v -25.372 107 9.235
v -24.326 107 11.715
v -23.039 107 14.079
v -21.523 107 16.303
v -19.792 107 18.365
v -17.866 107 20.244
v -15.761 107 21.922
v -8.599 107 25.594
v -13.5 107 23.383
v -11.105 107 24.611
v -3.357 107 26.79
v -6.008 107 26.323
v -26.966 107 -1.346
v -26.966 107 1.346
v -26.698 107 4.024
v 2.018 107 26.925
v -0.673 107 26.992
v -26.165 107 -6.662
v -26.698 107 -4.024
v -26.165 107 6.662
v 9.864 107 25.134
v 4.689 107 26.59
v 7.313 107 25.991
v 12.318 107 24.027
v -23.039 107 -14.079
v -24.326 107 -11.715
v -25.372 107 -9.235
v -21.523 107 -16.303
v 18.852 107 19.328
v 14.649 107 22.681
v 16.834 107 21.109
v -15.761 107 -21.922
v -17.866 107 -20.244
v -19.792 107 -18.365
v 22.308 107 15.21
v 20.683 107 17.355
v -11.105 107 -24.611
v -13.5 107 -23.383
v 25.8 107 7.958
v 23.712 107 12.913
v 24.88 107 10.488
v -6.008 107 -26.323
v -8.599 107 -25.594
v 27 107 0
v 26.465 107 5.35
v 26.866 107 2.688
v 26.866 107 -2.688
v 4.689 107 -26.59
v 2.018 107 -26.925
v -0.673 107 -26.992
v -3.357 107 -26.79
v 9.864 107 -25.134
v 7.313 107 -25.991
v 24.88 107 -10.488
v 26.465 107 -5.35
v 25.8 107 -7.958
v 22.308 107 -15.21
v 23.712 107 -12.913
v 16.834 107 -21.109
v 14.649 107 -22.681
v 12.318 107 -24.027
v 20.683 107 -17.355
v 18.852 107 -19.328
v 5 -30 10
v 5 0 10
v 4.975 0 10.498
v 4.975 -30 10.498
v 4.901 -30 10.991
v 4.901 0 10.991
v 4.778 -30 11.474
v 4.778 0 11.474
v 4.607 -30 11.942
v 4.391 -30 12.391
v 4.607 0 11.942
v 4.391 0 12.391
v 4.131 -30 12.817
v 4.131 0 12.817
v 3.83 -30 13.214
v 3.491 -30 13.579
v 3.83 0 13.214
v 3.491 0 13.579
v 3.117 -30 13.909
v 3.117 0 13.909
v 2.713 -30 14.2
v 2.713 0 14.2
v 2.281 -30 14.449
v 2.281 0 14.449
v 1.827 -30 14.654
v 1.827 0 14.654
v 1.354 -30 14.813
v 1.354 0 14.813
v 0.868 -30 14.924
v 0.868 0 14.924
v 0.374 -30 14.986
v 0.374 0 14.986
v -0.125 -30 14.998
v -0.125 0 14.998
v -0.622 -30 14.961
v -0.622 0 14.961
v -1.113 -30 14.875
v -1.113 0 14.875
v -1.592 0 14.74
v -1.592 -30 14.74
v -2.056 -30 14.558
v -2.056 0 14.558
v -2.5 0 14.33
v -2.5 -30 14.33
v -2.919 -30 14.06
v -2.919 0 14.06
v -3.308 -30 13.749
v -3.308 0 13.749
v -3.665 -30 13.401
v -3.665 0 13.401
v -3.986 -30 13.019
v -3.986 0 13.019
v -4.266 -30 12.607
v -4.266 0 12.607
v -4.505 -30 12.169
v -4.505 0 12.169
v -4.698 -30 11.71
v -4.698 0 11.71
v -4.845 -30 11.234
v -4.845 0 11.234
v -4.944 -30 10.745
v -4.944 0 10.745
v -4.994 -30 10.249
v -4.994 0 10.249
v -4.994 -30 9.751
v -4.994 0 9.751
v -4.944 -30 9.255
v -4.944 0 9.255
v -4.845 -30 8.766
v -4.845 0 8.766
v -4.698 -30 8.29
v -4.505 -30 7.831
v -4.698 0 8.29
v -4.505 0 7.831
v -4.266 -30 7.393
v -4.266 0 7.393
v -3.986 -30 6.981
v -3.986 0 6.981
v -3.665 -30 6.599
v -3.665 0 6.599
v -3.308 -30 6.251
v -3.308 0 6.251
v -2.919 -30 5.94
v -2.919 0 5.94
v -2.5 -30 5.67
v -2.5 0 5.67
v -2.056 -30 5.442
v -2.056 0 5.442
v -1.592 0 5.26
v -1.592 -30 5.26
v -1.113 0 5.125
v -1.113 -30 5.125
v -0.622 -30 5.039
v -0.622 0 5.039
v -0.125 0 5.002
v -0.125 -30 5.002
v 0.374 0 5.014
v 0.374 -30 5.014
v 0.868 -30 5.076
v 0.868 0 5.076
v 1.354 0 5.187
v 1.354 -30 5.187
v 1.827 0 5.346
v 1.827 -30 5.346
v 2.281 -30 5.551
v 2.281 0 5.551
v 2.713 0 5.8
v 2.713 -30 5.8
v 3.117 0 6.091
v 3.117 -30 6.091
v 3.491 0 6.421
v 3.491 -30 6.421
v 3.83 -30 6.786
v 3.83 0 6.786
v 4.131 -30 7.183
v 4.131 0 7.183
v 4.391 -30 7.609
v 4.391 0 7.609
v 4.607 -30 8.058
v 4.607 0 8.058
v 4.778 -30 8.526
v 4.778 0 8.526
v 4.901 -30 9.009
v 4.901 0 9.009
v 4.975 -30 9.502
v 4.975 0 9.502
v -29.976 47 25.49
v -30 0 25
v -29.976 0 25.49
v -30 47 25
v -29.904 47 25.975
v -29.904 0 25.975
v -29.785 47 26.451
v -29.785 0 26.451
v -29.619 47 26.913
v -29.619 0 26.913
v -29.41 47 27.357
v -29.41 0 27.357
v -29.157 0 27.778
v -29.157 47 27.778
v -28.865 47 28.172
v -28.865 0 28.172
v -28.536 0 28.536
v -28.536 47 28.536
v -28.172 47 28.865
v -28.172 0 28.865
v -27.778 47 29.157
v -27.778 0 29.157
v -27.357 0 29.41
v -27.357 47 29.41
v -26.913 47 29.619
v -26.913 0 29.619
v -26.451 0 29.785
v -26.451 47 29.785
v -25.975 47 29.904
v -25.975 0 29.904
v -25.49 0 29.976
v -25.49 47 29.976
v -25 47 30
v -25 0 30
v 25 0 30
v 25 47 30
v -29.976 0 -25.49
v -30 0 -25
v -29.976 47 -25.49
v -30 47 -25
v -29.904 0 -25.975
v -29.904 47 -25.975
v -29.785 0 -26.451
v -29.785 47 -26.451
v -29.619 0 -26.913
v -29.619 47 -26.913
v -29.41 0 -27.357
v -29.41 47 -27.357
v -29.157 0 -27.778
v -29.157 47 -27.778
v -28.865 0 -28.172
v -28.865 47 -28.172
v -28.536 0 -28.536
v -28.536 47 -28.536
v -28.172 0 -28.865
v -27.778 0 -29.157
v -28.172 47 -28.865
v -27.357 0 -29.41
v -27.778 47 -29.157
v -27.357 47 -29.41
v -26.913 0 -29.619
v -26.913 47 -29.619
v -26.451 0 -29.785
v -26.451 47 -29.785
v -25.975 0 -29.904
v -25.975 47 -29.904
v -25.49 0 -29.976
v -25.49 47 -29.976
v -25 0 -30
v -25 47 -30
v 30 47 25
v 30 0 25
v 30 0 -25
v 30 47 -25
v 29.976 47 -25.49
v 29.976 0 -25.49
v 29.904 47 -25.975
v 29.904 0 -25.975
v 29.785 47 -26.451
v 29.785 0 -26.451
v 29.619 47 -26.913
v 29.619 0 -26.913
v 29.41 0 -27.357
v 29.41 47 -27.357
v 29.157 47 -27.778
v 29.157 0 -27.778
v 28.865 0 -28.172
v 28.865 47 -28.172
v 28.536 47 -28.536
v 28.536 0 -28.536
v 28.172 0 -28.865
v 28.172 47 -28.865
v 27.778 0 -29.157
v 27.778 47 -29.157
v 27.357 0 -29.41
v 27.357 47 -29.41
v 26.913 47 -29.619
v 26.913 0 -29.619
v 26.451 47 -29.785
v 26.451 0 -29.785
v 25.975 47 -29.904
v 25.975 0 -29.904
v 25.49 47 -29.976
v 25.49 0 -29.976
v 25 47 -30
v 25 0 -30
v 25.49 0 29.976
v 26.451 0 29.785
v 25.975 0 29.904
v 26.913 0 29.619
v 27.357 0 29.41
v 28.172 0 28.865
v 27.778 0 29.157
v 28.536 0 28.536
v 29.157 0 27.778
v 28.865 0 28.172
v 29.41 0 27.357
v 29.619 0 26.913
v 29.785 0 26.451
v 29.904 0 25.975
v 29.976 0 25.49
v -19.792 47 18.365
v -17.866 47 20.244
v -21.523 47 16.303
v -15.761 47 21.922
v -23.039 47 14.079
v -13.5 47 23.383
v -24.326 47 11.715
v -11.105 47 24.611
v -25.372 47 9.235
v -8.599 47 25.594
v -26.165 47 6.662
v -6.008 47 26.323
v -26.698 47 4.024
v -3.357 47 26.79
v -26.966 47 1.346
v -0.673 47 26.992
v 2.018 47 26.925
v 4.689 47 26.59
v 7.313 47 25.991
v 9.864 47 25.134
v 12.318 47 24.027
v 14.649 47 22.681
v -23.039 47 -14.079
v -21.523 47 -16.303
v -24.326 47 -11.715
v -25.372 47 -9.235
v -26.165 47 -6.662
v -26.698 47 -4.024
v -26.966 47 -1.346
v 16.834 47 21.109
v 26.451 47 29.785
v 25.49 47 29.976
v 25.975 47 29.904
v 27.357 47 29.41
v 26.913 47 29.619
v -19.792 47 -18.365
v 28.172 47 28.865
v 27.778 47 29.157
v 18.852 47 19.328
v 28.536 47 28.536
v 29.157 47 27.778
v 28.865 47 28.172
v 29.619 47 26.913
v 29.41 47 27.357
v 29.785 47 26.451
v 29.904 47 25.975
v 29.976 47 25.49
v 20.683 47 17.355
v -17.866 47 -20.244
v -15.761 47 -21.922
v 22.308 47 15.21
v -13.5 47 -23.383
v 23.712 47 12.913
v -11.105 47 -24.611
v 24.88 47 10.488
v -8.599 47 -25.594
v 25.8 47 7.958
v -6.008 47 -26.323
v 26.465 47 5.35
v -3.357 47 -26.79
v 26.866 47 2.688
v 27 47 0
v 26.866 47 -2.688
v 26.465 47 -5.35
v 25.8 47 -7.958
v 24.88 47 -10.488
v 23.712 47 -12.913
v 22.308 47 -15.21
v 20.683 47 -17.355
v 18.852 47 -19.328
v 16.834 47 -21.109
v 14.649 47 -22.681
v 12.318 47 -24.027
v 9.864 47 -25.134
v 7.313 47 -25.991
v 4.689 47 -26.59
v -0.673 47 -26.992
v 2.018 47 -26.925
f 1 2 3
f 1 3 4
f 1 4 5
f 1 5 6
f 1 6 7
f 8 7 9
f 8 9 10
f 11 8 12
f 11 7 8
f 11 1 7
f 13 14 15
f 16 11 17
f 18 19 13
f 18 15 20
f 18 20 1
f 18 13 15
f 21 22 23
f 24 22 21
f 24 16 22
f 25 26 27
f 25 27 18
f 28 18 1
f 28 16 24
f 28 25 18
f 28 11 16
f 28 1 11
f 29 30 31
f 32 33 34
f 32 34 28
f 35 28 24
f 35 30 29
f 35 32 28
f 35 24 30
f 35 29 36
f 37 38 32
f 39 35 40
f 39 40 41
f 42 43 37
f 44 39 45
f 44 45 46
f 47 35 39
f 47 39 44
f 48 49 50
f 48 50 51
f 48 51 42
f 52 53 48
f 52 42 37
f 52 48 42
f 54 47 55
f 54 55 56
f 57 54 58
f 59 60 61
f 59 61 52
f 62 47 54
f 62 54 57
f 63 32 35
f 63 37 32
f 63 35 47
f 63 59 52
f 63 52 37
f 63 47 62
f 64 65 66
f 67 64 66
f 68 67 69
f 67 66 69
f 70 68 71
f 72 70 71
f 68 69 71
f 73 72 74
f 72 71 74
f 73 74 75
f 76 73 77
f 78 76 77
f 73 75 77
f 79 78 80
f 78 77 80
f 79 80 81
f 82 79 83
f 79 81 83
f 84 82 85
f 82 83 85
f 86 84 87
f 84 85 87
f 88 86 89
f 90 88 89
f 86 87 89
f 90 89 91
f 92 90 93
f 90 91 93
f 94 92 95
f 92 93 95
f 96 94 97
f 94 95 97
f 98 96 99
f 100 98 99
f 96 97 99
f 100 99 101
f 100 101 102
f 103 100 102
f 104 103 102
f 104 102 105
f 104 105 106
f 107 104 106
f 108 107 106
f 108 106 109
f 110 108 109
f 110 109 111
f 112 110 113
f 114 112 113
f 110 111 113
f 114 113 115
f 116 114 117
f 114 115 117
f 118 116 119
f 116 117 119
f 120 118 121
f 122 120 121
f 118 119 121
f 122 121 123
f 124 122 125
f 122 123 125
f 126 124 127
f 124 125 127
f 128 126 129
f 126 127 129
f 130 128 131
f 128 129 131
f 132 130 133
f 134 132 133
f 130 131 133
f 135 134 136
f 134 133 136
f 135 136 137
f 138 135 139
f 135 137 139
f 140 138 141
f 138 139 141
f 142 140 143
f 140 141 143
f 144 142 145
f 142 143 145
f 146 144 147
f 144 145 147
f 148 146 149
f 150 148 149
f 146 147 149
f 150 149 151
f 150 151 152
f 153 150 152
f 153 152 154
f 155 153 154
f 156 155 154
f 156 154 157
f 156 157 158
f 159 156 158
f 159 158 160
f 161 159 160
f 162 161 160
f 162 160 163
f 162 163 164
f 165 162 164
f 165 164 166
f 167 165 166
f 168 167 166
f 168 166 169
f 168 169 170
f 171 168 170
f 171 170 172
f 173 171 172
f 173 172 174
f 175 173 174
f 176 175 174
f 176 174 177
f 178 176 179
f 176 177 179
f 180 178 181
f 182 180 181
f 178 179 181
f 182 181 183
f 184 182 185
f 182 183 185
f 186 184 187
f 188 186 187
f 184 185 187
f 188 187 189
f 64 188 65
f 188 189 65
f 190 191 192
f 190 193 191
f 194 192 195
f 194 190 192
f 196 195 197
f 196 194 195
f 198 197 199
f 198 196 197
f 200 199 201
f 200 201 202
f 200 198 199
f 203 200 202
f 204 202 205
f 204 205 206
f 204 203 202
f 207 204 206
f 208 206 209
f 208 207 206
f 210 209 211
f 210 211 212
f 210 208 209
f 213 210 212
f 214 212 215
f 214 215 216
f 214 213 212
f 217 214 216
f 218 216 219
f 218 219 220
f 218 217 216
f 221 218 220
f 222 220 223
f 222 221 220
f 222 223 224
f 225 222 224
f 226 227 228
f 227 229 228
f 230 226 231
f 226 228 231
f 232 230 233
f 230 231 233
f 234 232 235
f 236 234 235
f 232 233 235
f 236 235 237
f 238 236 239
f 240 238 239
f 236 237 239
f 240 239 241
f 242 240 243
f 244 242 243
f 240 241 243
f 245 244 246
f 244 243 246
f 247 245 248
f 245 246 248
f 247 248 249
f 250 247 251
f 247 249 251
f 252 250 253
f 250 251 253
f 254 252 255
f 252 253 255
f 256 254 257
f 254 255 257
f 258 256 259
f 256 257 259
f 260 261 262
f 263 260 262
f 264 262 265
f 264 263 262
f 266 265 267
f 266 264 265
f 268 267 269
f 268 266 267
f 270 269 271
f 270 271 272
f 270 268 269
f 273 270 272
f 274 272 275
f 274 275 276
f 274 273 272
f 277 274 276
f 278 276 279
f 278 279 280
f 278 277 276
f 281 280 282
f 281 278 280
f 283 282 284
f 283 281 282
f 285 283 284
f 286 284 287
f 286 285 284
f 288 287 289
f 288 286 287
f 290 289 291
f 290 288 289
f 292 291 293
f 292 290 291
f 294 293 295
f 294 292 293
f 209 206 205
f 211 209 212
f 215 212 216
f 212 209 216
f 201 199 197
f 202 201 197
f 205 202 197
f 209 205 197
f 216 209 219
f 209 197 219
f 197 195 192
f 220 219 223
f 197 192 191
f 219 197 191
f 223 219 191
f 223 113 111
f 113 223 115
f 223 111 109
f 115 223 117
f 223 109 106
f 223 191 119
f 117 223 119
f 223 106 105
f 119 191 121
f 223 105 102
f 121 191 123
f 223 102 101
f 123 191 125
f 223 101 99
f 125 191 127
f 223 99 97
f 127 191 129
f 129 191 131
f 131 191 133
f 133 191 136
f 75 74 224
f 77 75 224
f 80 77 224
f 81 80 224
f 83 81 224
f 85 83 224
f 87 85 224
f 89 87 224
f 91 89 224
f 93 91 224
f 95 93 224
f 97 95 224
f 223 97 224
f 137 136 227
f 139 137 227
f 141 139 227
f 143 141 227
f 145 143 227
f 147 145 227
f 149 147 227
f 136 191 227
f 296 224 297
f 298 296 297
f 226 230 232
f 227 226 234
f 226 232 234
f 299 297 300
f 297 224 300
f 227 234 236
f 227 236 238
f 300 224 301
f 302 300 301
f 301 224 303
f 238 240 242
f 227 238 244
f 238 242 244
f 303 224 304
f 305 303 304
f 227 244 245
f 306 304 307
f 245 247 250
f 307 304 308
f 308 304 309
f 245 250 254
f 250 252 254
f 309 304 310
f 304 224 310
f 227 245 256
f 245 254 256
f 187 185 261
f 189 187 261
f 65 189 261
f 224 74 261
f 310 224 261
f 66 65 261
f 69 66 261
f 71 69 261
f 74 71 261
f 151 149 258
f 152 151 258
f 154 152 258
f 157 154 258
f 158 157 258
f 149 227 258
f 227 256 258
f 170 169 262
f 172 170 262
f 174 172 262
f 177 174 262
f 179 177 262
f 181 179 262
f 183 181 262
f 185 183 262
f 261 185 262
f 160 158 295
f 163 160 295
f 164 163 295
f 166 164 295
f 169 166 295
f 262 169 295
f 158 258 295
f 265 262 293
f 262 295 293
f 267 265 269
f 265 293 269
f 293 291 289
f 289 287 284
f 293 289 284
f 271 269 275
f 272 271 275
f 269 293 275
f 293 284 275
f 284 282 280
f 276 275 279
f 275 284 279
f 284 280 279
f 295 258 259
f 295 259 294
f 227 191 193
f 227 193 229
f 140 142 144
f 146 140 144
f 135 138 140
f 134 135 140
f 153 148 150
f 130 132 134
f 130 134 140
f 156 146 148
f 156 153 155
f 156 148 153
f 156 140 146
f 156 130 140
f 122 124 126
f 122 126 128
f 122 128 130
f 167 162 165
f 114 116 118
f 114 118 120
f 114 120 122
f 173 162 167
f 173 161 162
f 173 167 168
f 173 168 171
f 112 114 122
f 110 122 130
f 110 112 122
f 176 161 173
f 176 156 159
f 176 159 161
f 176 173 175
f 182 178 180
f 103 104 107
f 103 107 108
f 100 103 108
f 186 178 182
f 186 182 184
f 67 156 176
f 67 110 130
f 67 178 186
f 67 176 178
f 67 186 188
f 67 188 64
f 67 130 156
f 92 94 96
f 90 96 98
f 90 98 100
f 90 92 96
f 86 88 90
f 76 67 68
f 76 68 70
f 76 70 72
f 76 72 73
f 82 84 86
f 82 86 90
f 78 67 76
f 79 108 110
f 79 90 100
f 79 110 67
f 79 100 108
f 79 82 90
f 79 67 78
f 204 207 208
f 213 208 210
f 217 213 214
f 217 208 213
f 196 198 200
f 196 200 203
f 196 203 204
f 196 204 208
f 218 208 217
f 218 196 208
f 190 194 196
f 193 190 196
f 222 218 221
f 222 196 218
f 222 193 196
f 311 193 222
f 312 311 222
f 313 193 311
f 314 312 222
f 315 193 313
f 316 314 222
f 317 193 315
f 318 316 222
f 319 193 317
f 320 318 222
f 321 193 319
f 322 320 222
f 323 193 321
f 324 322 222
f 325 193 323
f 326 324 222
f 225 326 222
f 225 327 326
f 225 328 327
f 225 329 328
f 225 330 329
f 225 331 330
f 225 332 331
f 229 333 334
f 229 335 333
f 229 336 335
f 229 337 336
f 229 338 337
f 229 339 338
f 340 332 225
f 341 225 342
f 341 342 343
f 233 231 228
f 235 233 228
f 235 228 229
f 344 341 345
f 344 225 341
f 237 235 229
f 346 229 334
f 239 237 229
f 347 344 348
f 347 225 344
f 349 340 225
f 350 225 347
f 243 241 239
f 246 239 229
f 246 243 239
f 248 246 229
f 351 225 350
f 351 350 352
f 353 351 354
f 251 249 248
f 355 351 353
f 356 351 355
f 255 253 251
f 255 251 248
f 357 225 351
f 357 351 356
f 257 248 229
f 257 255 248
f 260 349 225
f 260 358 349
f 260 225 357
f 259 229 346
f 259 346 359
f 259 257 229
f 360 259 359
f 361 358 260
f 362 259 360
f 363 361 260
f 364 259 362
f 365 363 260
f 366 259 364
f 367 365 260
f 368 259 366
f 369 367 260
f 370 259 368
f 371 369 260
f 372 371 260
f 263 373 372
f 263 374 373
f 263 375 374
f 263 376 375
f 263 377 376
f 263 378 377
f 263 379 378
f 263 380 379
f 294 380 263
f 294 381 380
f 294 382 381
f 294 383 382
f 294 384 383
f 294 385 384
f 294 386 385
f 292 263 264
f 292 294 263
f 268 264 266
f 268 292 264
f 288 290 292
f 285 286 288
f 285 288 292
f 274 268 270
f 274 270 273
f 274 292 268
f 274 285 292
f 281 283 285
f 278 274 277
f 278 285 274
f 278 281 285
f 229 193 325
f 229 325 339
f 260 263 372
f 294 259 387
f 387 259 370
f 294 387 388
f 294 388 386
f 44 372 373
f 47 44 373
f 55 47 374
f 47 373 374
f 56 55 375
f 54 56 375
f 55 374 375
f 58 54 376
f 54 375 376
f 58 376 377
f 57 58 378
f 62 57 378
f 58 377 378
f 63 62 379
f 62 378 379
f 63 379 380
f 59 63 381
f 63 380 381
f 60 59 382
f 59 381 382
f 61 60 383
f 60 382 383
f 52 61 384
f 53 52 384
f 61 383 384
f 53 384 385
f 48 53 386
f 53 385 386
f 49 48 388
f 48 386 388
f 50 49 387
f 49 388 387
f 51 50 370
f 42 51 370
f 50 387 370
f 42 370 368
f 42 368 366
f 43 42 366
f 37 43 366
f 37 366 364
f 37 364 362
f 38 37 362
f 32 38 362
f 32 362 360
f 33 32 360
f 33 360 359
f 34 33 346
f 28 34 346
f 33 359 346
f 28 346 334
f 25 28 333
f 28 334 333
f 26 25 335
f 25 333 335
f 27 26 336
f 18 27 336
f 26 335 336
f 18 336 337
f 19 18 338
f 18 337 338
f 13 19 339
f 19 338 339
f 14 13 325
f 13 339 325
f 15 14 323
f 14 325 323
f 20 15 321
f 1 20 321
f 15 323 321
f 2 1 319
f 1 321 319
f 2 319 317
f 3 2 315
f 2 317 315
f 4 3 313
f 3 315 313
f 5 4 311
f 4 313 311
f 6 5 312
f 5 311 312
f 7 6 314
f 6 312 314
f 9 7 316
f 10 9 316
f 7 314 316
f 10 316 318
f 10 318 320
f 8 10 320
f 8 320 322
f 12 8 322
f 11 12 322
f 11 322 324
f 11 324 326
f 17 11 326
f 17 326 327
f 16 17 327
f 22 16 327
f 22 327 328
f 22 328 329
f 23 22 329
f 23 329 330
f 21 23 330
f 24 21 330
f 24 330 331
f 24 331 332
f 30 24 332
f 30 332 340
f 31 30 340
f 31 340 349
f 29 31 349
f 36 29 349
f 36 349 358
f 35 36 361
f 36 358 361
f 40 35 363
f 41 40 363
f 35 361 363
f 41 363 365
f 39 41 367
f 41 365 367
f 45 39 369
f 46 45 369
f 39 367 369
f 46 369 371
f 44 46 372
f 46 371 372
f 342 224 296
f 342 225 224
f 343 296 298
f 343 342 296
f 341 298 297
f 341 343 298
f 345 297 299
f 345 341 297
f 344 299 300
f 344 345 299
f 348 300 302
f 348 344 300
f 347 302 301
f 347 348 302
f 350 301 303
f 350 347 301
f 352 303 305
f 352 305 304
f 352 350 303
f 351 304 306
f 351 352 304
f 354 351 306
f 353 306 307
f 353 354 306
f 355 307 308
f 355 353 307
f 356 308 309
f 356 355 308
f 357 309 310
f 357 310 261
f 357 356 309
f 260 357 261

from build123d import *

# Parameters (mm, degrees)
SKETCH1_W           = 60
SKETCH1_H           = 60
BOSS_EXTRUDE1_DEPTH = 47
FILLET1_R           = 5
SKETCH2_R           = 27
BOSS_EXTRUDE2_DEPTH = 60
SKETCH3_R           = 5
BOSS_EXTRUDE3_DEPTH = 30


with BuildPart() as part:
    # Sketch1 → Boss-Extrude1 (new body)
    with BuildSketch(Plane(origin=(0, 0, 0), x_dir=(1, 0, 0), z_dir=(0, 1, 0))):
        Rectangle(SKETCH1_W, SKETCH1_H)
    extrude(amount=BOSS_EXTRUDE1_DEPTH)

    # Fillet1
    fillet1_edges = [part.edges().sort_by_distance(p)[0] for p in [
        (30, 23.5, 30),
        (-30, 23.5, 30),
        (-30, 23.5, -30),
        (30, 23.5, -30),
    ]]
    fillet(fillet1_edges, radius=FILLET1_R)

    # Sketch2 → Boss-Extrude2 (add)
    with BuildSketch(Plane(origin=(0, 47, 0), x_dir=(1, 0, 0), z_dir=(0, 1, 0))):
        Circle(SKETCH2_R)
    extrude(amount=BOSS_EXTRUDE2_DEPTH)

    # Sketch3 → Boss-Extrude3 (add)
    with BuildSketch(Plane.XZ):
        with Locations((0, 10)):
            Circle(SKETCH3_R)
    extrude(amount=BOSS_EXTRUDE3_DEPTH)


solid = part.part
